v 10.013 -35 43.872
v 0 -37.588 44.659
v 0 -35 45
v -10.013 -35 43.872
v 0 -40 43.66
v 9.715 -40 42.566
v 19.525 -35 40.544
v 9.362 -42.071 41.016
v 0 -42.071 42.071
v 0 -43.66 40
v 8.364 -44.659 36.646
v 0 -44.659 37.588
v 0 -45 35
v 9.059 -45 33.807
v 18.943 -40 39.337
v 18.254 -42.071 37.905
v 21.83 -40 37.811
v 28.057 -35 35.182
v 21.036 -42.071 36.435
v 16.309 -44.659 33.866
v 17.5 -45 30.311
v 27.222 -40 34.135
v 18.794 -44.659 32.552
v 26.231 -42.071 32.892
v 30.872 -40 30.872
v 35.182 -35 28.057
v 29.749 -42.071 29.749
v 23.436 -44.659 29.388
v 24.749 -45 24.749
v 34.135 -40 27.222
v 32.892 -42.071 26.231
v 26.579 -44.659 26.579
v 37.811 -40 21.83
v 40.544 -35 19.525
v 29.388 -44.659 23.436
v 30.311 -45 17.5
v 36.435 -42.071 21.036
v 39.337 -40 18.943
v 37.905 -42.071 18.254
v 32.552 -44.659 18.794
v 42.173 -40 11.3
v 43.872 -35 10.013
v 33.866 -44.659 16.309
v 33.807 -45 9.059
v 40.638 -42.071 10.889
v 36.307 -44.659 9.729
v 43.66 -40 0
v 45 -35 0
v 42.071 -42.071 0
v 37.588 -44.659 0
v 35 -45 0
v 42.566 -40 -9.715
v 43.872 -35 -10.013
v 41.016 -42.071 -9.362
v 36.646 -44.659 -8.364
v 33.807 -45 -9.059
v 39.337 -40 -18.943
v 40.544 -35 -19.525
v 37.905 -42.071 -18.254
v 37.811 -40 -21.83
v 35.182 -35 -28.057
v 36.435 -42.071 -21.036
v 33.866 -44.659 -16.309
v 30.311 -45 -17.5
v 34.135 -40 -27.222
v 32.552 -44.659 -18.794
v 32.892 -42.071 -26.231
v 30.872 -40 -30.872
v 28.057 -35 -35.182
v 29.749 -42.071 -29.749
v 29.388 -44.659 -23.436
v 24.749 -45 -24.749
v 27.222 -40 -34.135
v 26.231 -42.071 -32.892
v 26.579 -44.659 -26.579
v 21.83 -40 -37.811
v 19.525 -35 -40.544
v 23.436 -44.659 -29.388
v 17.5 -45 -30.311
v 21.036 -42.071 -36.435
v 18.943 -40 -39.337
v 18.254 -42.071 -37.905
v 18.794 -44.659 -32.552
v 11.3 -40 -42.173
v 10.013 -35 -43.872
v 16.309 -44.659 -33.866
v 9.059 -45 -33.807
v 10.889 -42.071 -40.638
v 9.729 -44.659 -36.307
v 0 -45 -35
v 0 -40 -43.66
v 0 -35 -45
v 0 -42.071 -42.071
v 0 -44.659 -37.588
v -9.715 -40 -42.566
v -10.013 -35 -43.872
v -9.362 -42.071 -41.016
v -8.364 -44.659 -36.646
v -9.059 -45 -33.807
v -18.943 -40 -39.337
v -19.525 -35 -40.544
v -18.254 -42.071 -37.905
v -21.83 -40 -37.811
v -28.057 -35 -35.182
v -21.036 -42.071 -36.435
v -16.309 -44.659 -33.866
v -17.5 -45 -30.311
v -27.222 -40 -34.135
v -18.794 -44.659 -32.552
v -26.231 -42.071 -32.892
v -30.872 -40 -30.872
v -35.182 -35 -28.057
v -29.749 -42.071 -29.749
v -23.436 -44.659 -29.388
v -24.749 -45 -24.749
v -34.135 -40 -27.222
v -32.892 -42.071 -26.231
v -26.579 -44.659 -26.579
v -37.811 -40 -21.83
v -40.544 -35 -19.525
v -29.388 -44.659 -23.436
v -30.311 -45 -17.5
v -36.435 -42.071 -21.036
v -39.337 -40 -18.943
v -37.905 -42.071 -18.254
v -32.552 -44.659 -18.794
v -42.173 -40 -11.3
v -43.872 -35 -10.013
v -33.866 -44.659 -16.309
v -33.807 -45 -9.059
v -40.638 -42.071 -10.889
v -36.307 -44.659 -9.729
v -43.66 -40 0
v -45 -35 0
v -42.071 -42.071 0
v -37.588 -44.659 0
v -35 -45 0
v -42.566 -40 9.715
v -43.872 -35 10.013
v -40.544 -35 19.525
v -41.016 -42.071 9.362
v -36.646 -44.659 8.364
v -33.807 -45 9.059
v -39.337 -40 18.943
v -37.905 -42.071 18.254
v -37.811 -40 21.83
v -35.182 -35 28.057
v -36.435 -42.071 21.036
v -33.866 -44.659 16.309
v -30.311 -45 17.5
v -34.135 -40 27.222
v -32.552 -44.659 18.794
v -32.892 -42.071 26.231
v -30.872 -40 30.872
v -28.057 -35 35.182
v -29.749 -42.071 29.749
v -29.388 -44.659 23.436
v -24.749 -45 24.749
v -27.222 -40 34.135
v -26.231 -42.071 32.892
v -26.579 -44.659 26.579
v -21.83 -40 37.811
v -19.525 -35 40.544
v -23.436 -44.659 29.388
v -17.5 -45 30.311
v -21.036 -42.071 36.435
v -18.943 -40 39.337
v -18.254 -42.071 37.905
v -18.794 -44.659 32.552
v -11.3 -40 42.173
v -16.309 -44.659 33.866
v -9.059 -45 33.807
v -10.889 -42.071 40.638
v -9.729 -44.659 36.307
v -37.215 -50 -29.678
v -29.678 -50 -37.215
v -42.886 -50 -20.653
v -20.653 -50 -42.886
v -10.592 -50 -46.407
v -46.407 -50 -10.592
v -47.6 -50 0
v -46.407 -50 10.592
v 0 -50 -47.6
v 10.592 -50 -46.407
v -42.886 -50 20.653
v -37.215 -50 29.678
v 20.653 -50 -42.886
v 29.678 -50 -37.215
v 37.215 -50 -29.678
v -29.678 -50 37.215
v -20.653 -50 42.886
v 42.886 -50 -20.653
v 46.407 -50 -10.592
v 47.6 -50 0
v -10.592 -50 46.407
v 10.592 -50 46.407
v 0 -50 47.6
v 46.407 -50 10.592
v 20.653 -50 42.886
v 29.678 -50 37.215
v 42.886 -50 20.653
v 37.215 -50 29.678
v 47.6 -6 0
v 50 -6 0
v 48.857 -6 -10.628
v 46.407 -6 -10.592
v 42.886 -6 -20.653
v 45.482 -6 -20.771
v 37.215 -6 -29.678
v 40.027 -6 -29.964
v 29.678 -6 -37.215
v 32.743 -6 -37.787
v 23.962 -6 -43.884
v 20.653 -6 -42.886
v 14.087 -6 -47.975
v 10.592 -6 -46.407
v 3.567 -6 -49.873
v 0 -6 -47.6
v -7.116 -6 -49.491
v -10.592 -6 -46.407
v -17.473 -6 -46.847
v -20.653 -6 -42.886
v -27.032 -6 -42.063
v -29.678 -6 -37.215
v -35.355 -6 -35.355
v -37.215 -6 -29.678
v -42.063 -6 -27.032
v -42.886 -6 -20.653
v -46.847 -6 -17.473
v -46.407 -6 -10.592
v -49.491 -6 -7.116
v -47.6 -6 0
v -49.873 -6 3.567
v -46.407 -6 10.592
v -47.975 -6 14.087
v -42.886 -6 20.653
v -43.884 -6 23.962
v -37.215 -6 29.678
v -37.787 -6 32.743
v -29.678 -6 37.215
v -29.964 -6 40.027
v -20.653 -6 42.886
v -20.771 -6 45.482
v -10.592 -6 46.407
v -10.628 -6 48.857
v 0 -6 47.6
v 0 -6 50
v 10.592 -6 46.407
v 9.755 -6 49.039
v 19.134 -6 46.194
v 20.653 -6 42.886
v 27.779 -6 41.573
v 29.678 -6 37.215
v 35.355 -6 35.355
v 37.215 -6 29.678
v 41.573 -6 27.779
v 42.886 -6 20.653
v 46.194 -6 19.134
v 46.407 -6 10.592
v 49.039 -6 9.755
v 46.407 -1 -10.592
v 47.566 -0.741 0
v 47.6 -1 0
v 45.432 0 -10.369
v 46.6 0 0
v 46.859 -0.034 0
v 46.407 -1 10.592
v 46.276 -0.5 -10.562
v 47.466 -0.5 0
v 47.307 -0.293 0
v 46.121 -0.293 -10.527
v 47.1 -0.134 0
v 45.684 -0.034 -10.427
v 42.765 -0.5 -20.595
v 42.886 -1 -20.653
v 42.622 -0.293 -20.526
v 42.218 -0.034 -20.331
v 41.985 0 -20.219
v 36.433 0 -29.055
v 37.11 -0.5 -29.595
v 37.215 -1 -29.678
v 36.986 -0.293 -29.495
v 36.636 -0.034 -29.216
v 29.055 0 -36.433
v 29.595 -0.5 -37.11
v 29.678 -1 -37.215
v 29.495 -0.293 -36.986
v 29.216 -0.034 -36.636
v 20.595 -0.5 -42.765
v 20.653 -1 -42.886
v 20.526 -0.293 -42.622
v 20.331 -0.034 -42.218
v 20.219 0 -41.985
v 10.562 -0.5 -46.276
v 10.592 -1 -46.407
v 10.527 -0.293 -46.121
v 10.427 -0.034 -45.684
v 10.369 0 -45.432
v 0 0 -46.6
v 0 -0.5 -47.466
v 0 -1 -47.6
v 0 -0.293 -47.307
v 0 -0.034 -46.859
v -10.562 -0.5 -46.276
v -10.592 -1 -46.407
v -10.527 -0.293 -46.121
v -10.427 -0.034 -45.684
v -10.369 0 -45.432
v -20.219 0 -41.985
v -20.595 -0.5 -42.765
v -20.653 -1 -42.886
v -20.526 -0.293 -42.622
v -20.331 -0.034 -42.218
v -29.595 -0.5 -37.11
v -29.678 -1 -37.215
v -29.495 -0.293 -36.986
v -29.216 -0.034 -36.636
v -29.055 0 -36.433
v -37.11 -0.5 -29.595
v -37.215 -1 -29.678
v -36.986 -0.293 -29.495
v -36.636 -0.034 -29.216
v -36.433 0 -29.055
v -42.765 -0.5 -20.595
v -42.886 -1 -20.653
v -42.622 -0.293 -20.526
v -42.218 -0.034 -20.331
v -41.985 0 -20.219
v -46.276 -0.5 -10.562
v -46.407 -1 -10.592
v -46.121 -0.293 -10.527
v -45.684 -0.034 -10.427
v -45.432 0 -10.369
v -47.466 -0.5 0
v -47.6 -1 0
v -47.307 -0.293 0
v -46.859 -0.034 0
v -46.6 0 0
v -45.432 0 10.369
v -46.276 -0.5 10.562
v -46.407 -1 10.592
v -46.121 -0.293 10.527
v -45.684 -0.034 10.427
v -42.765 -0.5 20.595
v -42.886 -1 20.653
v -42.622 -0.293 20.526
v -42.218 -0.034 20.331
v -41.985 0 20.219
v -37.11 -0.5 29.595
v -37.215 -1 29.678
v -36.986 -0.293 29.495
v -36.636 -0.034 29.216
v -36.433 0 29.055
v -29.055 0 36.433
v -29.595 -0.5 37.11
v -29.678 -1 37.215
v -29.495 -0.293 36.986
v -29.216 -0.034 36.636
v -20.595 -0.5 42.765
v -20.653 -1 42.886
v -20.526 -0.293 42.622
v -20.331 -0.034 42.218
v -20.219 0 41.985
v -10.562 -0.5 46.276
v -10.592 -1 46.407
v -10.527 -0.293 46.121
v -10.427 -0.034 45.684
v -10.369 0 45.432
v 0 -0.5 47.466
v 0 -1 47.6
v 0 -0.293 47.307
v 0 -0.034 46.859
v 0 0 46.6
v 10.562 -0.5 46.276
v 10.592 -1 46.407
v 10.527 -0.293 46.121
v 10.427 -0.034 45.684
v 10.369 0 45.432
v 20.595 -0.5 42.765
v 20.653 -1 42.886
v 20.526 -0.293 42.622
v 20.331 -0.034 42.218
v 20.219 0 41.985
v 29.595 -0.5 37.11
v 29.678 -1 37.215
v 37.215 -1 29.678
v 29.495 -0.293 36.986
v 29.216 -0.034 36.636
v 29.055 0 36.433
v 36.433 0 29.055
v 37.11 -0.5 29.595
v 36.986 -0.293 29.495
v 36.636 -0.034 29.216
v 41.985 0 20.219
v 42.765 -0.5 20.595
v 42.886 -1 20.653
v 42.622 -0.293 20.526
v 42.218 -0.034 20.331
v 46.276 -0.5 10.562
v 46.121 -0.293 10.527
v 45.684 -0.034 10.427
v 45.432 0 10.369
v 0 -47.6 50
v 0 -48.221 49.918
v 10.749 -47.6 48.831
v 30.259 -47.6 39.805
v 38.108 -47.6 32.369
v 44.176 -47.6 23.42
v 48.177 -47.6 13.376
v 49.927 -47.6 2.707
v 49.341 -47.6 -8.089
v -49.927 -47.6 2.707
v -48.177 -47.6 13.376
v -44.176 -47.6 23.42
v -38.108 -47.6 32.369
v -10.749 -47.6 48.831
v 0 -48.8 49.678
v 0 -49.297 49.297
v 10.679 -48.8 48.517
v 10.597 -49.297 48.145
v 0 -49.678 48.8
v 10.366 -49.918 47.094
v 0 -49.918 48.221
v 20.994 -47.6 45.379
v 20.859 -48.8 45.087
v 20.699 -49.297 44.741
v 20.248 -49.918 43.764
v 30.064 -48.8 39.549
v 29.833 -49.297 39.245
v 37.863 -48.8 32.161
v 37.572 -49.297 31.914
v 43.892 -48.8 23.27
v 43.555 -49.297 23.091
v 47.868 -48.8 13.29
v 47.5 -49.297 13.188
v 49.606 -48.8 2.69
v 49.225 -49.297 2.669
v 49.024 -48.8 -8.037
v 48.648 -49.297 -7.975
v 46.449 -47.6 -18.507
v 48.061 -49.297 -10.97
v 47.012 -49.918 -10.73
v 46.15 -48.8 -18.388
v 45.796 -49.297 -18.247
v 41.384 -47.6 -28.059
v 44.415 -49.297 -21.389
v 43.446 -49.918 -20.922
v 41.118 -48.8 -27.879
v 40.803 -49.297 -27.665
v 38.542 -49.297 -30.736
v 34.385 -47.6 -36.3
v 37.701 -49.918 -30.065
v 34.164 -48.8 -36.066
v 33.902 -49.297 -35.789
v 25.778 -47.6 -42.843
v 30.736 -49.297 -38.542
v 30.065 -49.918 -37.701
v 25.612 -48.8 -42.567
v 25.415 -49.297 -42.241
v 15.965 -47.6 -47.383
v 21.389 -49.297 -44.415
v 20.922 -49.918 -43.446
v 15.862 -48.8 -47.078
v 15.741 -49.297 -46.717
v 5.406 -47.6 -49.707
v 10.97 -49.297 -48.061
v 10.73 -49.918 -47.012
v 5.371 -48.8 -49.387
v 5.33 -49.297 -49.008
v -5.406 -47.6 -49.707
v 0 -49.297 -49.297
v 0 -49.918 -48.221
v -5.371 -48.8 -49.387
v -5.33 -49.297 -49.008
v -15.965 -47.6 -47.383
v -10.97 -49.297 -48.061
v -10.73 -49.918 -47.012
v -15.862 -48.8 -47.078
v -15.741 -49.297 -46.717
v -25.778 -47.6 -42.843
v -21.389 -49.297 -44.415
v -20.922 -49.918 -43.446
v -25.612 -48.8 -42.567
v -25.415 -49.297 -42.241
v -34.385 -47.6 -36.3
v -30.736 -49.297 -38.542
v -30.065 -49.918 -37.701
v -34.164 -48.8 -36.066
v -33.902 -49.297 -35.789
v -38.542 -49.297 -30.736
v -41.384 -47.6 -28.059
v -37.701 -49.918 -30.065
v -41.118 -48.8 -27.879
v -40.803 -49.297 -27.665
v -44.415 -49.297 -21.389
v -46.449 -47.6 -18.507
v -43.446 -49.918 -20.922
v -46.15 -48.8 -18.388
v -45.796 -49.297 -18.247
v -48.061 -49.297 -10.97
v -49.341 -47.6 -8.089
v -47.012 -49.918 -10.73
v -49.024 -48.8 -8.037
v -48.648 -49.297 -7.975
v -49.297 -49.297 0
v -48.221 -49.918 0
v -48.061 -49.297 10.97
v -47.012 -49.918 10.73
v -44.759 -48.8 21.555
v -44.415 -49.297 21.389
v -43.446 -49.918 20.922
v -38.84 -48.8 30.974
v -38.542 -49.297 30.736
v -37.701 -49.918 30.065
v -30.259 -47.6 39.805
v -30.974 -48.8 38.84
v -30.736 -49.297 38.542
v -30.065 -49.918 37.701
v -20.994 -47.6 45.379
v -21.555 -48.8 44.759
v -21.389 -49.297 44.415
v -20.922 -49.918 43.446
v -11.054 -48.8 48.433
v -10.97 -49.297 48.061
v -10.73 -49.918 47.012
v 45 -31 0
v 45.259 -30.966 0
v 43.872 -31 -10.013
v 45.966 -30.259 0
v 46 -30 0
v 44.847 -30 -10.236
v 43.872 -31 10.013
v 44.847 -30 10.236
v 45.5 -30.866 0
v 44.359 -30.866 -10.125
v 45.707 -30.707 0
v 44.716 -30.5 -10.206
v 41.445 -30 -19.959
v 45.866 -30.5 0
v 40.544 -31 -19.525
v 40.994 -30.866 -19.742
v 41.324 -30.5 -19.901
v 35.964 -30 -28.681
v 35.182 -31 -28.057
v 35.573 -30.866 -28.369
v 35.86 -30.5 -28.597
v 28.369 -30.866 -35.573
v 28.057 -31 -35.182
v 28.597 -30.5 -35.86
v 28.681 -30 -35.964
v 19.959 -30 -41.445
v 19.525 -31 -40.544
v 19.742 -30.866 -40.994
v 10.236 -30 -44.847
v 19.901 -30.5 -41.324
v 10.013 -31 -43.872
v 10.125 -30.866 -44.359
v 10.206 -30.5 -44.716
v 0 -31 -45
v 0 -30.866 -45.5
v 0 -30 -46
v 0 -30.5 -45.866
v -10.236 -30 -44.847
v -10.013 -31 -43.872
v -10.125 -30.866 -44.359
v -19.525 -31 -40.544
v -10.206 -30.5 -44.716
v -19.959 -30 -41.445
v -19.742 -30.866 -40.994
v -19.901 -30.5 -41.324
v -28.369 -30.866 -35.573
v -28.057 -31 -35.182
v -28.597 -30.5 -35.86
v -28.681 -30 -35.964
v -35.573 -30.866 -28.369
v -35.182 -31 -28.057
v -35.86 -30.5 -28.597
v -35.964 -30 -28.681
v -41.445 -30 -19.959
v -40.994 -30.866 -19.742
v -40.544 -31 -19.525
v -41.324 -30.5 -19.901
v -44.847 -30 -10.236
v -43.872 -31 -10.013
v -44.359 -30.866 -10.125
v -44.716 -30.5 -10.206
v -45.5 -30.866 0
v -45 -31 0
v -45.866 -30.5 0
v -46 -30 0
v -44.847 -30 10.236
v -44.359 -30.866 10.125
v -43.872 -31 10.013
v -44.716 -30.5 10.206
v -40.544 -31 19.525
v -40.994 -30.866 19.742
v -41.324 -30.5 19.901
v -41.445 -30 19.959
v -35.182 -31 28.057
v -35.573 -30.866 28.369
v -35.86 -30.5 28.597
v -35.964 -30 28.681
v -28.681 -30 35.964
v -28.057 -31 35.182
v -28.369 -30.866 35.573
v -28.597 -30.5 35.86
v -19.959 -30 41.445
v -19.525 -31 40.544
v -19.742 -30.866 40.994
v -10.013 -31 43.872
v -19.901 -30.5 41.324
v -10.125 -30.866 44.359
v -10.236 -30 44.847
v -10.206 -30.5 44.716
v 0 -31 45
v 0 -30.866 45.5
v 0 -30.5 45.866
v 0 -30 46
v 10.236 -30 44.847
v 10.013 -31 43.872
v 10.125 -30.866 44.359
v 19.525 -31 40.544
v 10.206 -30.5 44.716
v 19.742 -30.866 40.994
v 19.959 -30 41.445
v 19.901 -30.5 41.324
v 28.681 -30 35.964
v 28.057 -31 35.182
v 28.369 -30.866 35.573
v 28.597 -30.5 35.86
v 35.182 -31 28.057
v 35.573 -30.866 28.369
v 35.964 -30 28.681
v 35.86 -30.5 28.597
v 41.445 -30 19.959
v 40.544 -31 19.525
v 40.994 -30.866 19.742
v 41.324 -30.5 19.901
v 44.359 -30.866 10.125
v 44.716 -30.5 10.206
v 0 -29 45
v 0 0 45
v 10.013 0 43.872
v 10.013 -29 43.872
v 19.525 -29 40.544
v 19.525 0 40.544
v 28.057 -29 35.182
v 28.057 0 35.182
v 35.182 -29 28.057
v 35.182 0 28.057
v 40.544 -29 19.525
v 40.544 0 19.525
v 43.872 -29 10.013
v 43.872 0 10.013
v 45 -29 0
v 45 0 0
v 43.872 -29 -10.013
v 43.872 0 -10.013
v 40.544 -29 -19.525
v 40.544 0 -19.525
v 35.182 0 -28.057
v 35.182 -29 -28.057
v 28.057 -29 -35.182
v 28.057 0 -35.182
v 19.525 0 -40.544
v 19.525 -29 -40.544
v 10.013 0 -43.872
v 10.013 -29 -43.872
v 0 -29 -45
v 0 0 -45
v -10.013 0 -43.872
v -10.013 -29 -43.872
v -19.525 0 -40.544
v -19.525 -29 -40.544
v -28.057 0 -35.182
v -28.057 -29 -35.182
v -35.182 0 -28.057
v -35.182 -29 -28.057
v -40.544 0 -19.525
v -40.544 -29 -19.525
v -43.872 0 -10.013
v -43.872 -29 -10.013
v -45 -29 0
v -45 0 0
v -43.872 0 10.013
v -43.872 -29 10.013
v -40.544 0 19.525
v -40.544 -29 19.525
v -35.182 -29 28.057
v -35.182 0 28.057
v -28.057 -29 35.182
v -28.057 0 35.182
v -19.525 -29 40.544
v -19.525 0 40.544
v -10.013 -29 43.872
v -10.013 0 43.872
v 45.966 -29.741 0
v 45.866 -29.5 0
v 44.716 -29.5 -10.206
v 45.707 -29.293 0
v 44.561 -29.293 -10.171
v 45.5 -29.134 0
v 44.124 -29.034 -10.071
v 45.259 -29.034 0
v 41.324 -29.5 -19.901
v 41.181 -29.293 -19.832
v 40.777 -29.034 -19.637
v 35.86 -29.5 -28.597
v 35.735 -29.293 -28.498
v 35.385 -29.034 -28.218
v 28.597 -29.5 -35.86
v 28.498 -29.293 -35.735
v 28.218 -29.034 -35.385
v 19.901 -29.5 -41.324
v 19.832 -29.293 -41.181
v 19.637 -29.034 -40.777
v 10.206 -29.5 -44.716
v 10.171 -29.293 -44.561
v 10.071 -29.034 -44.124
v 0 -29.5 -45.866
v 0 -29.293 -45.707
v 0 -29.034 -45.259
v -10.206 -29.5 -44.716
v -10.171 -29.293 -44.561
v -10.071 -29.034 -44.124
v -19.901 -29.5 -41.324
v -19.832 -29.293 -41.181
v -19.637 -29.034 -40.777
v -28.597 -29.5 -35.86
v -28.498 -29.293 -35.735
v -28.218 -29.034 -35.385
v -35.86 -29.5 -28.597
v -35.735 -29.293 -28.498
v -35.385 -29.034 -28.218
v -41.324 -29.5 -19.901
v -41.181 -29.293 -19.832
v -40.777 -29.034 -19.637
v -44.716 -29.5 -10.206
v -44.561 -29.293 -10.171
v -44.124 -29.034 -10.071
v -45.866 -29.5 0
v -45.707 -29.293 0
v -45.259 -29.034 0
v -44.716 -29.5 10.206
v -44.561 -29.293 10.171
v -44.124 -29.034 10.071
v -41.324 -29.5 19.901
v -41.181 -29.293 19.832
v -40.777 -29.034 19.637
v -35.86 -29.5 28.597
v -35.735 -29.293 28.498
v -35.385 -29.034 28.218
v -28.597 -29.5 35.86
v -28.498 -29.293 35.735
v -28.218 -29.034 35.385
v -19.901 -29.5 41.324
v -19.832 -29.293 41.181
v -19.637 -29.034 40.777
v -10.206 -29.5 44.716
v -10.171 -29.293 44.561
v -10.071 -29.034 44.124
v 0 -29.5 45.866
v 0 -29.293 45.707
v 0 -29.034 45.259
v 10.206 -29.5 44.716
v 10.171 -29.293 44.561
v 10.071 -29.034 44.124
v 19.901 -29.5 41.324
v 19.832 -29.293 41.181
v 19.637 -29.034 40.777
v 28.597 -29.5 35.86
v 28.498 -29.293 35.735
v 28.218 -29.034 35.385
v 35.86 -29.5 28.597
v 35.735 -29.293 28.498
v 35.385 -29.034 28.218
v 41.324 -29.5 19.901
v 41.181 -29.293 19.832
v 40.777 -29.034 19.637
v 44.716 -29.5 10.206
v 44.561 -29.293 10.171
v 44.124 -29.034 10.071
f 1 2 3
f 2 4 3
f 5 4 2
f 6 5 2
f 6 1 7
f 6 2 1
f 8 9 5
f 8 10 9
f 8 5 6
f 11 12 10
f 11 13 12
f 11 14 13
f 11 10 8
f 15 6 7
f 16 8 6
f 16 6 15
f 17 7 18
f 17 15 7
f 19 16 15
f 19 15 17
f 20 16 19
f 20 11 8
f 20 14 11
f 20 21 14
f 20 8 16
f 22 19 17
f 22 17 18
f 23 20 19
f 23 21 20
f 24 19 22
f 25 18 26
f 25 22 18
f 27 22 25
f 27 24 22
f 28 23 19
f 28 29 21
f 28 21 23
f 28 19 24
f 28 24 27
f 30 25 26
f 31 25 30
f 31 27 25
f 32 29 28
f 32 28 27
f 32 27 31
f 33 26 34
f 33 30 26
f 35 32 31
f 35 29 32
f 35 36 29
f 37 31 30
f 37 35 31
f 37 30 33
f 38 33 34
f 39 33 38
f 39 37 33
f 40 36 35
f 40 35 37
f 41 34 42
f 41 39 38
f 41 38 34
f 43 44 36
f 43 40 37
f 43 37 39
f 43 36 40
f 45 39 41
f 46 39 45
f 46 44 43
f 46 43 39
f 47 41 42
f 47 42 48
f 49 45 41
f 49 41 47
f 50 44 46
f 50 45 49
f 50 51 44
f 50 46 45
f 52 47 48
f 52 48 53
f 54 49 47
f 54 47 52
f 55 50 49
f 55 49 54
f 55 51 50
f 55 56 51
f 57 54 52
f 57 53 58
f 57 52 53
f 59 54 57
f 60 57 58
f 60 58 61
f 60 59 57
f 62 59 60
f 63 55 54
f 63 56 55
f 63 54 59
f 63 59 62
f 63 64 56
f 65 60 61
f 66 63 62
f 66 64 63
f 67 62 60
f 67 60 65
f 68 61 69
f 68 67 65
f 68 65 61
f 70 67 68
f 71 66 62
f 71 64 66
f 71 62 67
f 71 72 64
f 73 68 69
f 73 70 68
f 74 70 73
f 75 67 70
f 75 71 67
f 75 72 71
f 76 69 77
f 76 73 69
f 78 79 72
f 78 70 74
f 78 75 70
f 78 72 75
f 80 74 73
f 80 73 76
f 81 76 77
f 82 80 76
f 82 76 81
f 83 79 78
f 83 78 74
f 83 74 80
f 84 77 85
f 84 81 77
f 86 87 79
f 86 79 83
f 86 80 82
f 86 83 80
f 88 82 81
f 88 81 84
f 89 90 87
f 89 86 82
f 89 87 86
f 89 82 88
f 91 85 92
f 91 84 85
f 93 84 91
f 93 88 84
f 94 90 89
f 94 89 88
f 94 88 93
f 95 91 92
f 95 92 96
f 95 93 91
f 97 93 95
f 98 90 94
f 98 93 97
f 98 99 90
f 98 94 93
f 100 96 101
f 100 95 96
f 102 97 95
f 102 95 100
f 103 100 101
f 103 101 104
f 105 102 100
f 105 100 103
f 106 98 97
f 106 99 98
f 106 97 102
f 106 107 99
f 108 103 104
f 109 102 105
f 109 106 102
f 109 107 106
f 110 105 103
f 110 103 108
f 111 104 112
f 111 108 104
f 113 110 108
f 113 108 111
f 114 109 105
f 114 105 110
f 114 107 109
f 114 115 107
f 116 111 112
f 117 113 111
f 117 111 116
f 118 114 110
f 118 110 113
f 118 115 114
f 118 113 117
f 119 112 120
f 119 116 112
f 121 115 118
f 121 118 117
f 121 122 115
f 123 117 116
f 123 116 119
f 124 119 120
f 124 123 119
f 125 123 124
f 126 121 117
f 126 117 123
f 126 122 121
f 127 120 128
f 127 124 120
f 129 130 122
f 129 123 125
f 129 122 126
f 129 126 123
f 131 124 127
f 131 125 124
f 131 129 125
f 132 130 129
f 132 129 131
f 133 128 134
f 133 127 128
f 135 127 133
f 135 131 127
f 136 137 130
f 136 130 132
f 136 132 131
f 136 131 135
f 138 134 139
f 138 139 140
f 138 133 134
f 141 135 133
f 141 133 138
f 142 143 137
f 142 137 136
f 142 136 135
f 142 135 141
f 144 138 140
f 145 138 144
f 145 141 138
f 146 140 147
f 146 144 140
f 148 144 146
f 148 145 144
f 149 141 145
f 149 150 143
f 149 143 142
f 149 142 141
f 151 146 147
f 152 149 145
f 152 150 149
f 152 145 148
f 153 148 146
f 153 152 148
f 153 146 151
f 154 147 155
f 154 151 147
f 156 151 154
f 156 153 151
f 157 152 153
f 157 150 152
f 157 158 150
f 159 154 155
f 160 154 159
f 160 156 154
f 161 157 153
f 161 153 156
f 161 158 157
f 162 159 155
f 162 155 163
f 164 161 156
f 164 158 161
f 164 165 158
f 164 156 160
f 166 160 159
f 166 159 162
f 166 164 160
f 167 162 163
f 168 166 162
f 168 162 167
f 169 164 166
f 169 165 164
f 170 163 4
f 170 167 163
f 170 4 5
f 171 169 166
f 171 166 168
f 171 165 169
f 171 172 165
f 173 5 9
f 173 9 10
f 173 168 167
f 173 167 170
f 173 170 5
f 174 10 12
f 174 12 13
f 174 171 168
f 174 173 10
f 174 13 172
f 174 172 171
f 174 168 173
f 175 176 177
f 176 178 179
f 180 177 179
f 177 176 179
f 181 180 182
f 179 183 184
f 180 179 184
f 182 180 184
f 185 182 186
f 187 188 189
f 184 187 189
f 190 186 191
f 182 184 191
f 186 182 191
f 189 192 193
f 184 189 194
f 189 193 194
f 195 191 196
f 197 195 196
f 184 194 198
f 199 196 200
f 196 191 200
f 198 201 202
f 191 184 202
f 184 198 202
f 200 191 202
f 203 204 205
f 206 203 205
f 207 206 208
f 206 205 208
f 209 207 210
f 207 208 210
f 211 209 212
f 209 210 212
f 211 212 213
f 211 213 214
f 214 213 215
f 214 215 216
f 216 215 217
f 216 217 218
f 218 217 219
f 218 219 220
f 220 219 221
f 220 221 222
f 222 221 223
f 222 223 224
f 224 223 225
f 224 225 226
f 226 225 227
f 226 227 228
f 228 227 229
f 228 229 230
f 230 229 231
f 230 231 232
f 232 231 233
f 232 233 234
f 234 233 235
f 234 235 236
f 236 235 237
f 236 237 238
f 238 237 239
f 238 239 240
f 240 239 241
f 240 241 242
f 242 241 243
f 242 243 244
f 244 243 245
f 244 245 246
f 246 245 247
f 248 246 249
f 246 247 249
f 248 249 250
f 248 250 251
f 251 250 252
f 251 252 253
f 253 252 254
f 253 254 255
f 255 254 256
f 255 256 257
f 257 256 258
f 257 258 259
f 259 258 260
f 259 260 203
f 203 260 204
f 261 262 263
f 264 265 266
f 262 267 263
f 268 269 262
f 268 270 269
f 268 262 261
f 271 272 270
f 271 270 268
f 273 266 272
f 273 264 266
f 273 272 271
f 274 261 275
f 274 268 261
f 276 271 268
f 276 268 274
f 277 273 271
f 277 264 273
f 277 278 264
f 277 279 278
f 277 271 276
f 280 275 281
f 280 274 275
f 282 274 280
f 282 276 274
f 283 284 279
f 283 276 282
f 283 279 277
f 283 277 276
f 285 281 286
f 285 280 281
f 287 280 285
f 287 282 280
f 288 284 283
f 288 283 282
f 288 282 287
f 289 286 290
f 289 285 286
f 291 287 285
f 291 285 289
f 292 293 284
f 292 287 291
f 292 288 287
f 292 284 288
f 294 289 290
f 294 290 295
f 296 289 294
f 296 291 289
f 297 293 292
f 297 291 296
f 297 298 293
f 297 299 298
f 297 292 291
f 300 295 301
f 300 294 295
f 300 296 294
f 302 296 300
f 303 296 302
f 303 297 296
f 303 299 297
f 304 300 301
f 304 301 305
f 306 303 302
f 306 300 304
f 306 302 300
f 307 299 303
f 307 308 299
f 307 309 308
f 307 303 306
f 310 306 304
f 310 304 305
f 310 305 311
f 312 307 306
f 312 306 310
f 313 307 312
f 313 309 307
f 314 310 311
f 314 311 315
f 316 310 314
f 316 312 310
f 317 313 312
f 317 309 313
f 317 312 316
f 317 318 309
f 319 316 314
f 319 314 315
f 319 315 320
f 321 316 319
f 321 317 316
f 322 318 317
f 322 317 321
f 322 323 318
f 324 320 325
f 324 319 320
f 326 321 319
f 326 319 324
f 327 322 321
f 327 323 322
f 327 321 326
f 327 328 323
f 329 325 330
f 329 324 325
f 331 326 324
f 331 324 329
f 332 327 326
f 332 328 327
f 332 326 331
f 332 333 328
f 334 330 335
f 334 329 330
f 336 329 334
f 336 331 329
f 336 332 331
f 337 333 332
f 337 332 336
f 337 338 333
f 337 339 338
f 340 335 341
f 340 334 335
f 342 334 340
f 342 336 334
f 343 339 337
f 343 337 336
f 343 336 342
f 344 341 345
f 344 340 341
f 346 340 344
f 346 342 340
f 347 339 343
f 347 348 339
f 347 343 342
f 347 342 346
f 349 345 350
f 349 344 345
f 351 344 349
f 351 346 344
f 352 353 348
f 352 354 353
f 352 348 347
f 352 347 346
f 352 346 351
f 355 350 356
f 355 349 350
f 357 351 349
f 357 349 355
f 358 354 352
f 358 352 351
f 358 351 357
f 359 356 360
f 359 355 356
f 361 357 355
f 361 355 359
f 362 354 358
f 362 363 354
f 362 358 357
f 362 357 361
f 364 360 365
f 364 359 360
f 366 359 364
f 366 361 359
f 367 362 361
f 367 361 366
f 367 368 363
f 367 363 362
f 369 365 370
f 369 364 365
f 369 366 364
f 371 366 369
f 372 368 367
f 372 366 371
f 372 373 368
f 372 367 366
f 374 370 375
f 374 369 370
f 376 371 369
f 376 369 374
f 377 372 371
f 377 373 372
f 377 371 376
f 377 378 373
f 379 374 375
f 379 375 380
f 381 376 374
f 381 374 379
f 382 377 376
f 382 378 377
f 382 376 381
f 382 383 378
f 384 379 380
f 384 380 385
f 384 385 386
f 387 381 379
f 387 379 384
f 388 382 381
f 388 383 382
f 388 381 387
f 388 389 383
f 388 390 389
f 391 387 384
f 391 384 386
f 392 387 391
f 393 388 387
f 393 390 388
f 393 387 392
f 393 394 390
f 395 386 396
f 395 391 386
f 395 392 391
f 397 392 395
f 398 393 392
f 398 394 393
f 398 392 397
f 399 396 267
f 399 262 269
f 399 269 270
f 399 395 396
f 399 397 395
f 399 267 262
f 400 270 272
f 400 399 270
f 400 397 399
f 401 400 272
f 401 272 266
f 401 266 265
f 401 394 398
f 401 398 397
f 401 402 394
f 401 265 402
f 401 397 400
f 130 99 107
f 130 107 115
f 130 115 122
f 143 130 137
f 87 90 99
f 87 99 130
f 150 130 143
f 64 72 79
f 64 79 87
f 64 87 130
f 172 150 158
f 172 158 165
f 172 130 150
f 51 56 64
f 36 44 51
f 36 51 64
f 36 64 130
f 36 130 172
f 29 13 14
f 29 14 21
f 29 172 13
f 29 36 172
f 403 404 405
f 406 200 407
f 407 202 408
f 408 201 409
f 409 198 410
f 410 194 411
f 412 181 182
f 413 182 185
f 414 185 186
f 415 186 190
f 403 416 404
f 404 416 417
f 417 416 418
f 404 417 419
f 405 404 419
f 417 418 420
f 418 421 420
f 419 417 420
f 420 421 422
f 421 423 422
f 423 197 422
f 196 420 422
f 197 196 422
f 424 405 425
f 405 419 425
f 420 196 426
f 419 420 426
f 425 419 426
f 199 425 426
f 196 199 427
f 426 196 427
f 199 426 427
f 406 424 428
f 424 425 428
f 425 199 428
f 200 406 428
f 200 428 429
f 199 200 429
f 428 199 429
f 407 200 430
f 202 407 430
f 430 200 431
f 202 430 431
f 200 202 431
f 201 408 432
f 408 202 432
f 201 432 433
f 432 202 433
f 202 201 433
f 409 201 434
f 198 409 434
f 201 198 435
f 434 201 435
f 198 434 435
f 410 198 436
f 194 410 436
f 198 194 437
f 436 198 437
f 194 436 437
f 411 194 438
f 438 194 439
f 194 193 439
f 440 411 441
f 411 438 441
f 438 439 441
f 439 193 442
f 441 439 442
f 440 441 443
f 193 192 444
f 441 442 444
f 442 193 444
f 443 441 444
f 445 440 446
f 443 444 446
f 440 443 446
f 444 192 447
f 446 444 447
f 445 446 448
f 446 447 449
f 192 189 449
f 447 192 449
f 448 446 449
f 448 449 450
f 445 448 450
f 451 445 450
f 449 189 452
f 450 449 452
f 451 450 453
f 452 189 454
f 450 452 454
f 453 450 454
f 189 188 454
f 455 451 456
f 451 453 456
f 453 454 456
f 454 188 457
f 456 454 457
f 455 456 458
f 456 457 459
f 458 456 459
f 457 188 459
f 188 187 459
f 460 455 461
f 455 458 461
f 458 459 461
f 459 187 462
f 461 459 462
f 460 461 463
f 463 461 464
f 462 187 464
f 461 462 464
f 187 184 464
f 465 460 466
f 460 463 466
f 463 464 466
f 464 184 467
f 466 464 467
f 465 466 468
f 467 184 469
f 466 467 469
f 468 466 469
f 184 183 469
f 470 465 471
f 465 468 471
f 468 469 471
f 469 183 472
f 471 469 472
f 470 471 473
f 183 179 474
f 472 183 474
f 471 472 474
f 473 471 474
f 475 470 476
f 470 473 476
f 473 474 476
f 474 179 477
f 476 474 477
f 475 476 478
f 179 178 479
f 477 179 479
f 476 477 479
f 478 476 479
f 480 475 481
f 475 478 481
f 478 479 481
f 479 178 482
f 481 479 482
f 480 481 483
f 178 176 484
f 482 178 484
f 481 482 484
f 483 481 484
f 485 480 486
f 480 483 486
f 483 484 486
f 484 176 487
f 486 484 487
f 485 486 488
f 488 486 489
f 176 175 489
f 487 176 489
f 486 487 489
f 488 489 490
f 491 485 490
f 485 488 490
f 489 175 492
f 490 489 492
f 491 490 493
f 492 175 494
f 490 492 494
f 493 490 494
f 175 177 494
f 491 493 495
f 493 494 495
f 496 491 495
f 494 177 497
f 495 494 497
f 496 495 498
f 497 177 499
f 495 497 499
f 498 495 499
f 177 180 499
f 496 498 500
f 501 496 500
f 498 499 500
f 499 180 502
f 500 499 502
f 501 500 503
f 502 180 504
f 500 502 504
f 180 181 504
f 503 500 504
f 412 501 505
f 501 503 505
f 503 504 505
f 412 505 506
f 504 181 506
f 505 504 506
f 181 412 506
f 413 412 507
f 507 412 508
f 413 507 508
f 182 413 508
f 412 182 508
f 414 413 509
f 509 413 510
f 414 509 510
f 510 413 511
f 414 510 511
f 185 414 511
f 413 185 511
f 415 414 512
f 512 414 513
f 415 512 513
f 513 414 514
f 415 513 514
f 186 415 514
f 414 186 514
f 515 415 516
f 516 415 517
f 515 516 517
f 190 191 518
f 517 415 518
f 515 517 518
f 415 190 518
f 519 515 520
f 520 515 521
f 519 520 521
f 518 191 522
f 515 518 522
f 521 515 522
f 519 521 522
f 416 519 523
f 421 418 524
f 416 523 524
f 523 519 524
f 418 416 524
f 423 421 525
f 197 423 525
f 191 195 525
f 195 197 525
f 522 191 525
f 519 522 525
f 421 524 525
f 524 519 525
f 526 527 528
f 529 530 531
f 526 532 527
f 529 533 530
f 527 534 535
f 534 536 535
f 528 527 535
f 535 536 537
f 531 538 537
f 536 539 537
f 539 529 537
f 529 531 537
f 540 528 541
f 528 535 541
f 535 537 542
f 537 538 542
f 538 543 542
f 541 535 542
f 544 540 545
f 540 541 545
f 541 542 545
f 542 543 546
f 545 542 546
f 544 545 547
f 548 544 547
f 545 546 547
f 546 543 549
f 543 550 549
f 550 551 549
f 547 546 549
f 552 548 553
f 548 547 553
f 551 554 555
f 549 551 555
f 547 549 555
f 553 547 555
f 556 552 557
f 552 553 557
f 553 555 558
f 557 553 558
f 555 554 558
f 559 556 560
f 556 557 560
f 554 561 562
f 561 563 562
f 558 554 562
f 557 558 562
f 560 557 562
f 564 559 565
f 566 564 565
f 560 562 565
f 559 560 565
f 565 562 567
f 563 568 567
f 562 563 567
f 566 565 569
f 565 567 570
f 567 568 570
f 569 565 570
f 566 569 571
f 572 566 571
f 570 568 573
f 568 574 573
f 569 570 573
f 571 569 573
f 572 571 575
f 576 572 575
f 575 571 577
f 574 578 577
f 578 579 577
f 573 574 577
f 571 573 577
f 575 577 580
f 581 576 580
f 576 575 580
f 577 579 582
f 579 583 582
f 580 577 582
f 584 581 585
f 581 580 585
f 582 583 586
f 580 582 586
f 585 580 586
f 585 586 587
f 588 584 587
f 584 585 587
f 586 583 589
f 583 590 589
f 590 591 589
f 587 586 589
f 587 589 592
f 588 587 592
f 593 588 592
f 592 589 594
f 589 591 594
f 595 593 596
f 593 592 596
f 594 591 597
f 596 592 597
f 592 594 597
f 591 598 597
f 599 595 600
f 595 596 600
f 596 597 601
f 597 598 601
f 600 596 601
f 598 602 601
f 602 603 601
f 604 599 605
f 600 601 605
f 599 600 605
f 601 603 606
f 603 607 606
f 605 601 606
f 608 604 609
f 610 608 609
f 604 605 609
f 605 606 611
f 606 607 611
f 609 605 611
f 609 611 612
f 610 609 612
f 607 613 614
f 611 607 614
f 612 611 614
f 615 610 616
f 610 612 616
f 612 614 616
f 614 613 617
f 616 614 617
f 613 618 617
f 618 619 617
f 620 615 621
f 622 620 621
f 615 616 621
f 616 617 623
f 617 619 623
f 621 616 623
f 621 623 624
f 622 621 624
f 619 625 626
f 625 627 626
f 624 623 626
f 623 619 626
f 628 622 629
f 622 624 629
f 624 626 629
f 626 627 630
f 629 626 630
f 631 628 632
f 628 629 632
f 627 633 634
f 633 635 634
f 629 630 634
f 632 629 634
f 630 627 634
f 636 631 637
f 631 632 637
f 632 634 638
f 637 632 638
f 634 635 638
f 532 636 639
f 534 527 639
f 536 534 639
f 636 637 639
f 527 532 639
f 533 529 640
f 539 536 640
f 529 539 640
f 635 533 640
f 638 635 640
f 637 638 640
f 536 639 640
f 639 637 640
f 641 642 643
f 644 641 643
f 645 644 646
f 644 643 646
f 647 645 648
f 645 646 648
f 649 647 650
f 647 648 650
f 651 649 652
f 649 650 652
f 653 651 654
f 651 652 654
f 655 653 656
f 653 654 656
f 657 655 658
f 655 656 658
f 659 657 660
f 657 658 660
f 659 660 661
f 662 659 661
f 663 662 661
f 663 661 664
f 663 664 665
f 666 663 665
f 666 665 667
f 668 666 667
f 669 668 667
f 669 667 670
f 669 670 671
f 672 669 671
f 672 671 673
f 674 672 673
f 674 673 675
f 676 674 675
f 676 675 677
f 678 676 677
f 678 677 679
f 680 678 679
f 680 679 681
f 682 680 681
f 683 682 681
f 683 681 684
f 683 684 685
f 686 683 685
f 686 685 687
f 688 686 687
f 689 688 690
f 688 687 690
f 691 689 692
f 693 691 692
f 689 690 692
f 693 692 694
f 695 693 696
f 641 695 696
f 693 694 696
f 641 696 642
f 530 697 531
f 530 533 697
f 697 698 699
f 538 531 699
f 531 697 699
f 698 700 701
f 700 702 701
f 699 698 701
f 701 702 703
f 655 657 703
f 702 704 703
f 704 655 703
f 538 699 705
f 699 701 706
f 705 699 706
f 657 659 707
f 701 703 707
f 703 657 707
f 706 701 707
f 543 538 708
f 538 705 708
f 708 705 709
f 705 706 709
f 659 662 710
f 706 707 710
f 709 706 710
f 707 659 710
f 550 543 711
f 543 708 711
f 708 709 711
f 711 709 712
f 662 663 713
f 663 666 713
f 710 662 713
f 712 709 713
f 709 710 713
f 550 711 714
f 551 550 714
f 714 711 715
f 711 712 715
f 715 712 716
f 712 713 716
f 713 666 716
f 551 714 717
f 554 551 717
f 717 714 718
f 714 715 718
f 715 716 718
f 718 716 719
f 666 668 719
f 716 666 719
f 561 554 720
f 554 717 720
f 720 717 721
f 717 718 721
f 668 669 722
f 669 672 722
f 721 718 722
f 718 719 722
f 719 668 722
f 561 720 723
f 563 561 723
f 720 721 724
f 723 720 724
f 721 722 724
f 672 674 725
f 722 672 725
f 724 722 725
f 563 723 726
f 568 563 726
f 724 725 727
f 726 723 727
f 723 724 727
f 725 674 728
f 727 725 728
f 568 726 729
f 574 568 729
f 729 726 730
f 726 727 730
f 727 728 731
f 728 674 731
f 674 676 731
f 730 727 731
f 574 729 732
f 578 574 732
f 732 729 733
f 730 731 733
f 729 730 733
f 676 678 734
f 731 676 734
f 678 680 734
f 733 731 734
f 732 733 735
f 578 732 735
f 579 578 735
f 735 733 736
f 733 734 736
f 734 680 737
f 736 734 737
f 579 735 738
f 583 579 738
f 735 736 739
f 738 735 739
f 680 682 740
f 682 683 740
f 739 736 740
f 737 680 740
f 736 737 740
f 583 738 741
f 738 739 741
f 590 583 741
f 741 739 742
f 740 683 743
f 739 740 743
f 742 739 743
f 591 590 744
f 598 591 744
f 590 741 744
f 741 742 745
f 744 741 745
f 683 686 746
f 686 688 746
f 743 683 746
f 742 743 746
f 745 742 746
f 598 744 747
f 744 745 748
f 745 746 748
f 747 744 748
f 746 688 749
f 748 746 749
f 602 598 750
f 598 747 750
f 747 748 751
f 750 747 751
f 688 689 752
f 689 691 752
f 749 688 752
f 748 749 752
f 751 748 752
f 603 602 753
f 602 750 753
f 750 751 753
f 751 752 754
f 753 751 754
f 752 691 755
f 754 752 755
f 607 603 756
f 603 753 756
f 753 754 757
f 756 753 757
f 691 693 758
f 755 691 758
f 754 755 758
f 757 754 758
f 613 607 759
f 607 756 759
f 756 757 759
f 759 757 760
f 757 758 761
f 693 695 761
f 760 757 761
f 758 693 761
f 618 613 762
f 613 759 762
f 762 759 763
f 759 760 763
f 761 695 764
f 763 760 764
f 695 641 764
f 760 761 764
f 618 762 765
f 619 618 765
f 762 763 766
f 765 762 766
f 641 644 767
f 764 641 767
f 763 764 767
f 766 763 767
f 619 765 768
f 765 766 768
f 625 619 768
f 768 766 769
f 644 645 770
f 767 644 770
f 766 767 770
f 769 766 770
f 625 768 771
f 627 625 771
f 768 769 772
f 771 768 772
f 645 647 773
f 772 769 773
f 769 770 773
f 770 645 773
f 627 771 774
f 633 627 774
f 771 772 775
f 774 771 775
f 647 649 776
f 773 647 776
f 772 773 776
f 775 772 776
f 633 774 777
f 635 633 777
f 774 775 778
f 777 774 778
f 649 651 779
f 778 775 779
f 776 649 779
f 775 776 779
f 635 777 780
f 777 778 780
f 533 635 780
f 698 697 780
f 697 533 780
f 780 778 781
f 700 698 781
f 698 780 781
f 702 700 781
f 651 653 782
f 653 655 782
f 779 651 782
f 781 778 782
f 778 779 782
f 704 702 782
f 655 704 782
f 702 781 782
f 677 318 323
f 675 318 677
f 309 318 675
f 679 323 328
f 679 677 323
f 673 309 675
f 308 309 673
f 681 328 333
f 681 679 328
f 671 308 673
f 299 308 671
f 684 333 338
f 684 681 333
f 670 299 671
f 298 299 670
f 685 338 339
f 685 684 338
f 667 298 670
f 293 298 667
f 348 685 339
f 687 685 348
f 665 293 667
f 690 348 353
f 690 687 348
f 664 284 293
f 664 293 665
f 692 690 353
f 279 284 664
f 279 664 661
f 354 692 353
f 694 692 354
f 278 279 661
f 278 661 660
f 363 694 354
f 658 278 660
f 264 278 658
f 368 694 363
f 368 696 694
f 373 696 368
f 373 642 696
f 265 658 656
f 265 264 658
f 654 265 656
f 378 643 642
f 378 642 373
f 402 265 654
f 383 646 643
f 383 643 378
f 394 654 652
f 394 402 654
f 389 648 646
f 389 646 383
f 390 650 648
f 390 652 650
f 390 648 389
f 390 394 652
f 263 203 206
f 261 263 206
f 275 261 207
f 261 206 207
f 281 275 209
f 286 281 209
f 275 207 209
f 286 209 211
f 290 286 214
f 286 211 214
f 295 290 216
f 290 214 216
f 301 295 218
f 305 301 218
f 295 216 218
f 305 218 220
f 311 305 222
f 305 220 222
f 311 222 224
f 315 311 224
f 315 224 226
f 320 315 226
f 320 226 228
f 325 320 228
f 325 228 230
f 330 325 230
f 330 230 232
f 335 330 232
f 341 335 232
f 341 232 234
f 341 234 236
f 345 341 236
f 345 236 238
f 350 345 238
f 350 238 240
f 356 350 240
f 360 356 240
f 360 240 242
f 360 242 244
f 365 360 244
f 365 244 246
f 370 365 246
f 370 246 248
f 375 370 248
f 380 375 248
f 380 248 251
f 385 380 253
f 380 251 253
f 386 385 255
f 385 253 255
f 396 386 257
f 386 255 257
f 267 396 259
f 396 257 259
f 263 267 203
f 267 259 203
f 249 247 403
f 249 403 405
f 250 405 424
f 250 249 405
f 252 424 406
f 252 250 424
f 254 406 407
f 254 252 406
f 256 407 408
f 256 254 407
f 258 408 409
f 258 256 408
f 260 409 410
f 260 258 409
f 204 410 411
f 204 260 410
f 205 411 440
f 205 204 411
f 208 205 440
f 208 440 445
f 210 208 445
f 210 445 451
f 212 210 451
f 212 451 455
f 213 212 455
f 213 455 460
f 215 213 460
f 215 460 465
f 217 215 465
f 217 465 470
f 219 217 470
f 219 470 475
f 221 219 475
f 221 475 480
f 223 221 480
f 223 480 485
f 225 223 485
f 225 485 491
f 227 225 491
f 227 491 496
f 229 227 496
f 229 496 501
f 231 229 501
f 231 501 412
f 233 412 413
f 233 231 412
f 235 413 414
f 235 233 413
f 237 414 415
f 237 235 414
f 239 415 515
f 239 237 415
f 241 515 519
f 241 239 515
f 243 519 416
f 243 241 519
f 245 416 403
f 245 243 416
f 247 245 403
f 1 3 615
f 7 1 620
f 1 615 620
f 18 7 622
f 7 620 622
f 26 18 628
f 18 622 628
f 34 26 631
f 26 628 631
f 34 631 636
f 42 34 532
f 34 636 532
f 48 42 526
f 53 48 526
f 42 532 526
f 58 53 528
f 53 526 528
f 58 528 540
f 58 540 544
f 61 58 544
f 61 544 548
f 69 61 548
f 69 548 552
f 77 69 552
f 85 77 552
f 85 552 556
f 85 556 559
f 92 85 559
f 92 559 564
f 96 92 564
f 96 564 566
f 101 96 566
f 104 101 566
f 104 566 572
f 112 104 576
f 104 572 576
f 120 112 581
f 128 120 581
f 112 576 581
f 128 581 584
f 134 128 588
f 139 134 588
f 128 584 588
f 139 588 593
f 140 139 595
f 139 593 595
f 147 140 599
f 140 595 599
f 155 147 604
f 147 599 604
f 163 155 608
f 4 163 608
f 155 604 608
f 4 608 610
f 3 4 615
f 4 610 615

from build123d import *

# Parameters (mm, degrees)
SKETCH1_R           = 50
BOSS_EXTRUDE1_DEPTH = 50
SHELL2_T            = -5
SKETCH3_W           = 2.4
SKETCH3_H           = 6
FILLET1_R           = 1
FILLET2_R           = 10
FILLET3_R           = 2.4
SKETCH6_R           = 1


with BuildPart() as part:
    # Sketch1 → Boss-Extrude1 (new body)
    with BuildSketch(Plane(origin=(0, 0, 0), x_dir=(1, 0, 0), z_dir=(0, 1, 0))):
        with Locations(Location((0, 0, 0), (0, 0, 270))):
            Circle(SKETCH1_R)
    extrude(amount=-BOSS_EXTRUDE1_DEPTH)

    # Shell2
    shell2_openings = [part.faces().sort_by_distance(p)[0] for p in [
        (0, 0, 0),
    ]]
    offset(amount=SHELL2_T, openings=shell2_openings, kind=Kind.INTERSECTION)

    # Cut-Sweep1: sweep along a path in Sketch4
    with BuildLine(Plane(origin=(0, 0, 0), x_dir=(1, 0, 0), z_dir=(0, 1, 0))) as cut_sweep1_path:
        CenterArc((0, 0), 47.6, 0, 360)
    # Sketch3 → Cut-Sweep1 (sweep, cut)
    with BuildSketch(Plane.XY):
        with Locations((48.8, -3)):
            Rectangle(SKETCH3_W, SKETCH3_H)
    sweep(path=cut_sweep1_path.line, mode=Mode.SUBTRACT)

    # Fillet1
    fillet1_edges = [part.edges().sort_by_distance(p)[0] for p in [
        (-47.6, 0, 0),
    ]]
    fillet(fillet1_edges, radius=FILLET1_R)

    # Fillet2
    fillet2_edges = [part.edges().sort_by_distance(p)[0] for p in [
        (0, -45, -45),
    ]]
    fillet(fillet2_edges, radius=FILLET2_R)

    # Fillet3
    fillet3_edges = [part.edges().sort_by_distance(p)[0] for p in [
        (0, -50, -50),
    ]]
    fillet(fillet3_edges, radius=FILLET3_R)

    # Cut-Sweep2: sweep along a path in Sketch5
    with BuildLine(Plane(origin=(0, -30, 0), x_dir=(1, 0, 0), z_dir=(0, 1, 0))) as cut_sweep2_path:
        CenterArc((0, 0), 45, 0, 360)
    # Sketch6 → Cut-Sweep2 (sweep, cut)
    with BuildSketch(Plane.XY):
        with Locations((45, -30)):
            Circle(SKETCH6_R)
    sweep(path=cut_sweep2_path.line, mode=Mode.SUBTRACT)


solid = part.part
